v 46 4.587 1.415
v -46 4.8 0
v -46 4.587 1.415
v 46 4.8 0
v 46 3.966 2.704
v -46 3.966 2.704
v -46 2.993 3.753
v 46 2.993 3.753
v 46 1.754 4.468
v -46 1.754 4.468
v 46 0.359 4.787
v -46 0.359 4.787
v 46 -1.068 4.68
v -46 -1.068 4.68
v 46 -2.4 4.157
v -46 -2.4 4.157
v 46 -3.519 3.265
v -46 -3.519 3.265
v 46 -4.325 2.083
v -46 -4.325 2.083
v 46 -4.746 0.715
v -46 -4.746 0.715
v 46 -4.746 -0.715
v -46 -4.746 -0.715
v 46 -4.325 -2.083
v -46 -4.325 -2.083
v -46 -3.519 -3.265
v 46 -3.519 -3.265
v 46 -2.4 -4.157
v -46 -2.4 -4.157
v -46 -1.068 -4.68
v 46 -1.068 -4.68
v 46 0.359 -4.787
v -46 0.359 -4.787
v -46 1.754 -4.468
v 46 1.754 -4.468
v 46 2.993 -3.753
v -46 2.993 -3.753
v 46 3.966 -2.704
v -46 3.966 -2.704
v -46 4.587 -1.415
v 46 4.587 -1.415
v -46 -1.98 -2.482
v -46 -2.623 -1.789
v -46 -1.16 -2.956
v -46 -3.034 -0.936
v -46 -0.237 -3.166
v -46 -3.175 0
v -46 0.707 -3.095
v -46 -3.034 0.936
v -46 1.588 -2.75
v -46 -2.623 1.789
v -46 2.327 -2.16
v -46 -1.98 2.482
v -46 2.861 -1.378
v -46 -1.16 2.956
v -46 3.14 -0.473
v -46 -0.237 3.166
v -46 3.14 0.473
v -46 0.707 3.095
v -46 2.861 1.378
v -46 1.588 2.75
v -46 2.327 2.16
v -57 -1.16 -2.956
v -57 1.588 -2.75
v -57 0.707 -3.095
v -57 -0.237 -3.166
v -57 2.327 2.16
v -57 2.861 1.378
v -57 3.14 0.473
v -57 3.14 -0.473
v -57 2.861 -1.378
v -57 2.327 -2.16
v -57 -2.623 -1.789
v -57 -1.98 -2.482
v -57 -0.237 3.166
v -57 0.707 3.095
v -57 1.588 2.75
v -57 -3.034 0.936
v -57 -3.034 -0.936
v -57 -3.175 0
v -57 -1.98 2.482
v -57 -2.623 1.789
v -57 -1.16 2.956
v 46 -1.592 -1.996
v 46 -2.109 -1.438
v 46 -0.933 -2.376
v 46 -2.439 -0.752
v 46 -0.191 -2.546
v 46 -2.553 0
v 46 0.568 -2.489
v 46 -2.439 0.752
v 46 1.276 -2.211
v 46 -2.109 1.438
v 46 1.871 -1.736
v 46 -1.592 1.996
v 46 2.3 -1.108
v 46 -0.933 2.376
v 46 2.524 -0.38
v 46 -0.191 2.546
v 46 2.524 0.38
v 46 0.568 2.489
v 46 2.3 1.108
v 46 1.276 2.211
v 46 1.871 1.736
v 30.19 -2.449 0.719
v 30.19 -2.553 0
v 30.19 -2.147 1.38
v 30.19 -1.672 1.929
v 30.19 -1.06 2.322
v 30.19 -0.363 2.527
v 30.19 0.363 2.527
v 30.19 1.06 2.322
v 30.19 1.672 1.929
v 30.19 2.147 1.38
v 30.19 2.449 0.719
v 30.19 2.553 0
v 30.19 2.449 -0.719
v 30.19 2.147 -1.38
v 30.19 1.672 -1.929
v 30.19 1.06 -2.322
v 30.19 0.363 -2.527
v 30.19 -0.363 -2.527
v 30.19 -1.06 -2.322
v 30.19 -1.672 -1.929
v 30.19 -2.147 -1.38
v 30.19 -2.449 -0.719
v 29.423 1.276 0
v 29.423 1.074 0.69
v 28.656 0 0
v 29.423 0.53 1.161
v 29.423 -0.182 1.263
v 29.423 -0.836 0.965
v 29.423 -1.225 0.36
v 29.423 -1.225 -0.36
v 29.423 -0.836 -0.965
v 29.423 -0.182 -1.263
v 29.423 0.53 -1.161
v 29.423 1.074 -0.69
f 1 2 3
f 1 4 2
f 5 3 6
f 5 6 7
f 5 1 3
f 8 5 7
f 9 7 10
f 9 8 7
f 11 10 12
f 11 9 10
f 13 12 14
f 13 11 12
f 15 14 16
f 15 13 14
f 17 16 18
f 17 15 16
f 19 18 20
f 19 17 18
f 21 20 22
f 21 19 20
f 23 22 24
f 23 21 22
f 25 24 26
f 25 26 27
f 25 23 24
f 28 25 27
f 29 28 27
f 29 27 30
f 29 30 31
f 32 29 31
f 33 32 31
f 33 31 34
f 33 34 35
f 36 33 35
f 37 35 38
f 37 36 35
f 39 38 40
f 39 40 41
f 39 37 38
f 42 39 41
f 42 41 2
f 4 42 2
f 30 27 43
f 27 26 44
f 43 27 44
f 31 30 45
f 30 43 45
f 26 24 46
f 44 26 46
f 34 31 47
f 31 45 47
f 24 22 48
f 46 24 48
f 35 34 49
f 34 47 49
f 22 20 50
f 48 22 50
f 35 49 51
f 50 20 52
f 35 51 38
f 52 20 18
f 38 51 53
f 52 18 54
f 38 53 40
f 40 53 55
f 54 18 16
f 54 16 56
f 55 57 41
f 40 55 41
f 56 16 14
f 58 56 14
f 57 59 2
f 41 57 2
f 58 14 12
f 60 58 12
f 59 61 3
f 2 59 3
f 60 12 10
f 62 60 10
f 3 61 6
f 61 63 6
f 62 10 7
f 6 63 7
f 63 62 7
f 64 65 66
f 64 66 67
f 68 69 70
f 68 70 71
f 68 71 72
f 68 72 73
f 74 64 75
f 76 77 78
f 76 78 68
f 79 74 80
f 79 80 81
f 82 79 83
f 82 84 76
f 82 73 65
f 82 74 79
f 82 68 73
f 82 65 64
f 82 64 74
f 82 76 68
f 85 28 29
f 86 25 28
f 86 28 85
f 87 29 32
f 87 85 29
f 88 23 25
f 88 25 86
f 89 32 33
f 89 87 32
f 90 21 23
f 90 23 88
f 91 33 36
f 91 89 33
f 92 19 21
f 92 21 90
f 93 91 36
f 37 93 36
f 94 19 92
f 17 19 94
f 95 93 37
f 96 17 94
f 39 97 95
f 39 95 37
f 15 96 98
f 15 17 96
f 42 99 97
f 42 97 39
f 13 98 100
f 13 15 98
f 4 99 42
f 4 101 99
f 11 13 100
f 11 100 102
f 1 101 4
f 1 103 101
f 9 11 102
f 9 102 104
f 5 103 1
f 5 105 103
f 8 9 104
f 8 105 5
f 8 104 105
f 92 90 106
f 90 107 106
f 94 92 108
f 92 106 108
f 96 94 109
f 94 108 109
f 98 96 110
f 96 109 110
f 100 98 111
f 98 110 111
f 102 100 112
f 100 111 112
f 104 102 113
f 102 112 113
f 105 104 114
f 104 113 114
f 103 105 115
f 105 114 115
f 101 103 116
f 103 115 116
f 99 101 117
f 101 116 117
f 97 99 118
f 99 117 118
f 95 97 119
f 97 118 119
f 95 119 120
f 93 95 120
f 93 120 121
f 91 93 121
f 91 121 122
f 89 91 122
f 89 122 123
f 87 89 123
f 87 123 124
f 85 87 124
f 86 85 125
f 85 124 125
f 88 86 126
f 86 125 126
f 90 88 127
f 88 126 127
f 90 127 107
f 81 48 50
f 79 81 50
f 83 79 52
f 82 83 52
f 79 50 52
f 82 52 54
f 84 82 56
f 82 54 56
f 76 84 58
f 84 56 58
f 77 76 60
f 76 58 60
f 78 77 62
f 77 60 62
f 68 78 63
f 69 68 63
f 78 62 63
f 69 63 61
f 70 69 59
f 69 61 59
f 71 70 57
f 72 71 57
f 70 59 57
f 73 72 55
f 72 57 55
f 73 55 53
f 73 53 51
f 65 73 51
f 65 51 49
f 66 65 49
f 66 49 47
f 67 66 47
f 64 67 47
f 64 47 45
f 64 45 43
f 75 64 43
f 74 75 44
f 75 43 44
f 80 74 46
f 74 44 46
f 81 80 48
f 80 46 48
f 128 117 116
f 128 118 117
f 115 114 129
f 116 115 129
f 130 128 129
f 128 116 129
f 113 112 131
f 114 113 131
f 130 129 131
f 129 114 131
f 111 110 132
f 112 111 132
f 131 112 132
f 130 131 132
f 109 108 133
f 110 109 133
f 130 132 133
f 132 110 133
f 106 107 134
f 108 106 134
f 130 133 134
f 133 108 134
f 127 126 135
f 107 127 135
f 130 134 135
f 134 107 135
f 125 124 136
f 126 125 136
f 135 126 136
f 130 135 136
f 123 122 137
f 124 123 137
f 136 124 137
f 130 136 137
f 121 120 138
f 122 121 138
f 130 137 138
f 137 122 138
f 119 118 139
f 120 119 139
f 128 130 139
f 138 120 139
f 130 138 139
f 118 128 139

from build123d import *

# Parameters (mm, degrees)
F0_R     = 4.8
F1_DEPTH = 46
F3_D     = 5.1054
F3_DEPTH = 15.81
F3_TIP   = 1.5338169022
F4_R     = 3.175
F5_DEPTH = 11


with BuildPart() as f1:
    # F0 (on Right) → F1 (new body, symmetric)
    with BuildSketch(Plane.YZ):
        Circle(F0_R)
    extrude(amount=F1_DEPTH, both=True)

    # F3
    with Locations(Plane.YZ.offset(46)):
        with Locations((0, 0)):
            Hole(F3_D / 2, depth=F3_DEPTH)
            with Locations((0, 0, -(F3_DEPTH + F3_TIP / 2))):  # 118° drill point
                Cone(0, F3_D / 2, F3_TIP, mode=Mode.SUBTRACT)

    # F4 (on face) → F5 (join)
    with BuildSketch(Plane(origin=(-46, 0, 0), x_dir=(0, -1, 0), z_dir=(-1, 0, 0))):
        Circle(F4_R)
    extrude(amount=F5_DEPTH)


solid = f1.part
